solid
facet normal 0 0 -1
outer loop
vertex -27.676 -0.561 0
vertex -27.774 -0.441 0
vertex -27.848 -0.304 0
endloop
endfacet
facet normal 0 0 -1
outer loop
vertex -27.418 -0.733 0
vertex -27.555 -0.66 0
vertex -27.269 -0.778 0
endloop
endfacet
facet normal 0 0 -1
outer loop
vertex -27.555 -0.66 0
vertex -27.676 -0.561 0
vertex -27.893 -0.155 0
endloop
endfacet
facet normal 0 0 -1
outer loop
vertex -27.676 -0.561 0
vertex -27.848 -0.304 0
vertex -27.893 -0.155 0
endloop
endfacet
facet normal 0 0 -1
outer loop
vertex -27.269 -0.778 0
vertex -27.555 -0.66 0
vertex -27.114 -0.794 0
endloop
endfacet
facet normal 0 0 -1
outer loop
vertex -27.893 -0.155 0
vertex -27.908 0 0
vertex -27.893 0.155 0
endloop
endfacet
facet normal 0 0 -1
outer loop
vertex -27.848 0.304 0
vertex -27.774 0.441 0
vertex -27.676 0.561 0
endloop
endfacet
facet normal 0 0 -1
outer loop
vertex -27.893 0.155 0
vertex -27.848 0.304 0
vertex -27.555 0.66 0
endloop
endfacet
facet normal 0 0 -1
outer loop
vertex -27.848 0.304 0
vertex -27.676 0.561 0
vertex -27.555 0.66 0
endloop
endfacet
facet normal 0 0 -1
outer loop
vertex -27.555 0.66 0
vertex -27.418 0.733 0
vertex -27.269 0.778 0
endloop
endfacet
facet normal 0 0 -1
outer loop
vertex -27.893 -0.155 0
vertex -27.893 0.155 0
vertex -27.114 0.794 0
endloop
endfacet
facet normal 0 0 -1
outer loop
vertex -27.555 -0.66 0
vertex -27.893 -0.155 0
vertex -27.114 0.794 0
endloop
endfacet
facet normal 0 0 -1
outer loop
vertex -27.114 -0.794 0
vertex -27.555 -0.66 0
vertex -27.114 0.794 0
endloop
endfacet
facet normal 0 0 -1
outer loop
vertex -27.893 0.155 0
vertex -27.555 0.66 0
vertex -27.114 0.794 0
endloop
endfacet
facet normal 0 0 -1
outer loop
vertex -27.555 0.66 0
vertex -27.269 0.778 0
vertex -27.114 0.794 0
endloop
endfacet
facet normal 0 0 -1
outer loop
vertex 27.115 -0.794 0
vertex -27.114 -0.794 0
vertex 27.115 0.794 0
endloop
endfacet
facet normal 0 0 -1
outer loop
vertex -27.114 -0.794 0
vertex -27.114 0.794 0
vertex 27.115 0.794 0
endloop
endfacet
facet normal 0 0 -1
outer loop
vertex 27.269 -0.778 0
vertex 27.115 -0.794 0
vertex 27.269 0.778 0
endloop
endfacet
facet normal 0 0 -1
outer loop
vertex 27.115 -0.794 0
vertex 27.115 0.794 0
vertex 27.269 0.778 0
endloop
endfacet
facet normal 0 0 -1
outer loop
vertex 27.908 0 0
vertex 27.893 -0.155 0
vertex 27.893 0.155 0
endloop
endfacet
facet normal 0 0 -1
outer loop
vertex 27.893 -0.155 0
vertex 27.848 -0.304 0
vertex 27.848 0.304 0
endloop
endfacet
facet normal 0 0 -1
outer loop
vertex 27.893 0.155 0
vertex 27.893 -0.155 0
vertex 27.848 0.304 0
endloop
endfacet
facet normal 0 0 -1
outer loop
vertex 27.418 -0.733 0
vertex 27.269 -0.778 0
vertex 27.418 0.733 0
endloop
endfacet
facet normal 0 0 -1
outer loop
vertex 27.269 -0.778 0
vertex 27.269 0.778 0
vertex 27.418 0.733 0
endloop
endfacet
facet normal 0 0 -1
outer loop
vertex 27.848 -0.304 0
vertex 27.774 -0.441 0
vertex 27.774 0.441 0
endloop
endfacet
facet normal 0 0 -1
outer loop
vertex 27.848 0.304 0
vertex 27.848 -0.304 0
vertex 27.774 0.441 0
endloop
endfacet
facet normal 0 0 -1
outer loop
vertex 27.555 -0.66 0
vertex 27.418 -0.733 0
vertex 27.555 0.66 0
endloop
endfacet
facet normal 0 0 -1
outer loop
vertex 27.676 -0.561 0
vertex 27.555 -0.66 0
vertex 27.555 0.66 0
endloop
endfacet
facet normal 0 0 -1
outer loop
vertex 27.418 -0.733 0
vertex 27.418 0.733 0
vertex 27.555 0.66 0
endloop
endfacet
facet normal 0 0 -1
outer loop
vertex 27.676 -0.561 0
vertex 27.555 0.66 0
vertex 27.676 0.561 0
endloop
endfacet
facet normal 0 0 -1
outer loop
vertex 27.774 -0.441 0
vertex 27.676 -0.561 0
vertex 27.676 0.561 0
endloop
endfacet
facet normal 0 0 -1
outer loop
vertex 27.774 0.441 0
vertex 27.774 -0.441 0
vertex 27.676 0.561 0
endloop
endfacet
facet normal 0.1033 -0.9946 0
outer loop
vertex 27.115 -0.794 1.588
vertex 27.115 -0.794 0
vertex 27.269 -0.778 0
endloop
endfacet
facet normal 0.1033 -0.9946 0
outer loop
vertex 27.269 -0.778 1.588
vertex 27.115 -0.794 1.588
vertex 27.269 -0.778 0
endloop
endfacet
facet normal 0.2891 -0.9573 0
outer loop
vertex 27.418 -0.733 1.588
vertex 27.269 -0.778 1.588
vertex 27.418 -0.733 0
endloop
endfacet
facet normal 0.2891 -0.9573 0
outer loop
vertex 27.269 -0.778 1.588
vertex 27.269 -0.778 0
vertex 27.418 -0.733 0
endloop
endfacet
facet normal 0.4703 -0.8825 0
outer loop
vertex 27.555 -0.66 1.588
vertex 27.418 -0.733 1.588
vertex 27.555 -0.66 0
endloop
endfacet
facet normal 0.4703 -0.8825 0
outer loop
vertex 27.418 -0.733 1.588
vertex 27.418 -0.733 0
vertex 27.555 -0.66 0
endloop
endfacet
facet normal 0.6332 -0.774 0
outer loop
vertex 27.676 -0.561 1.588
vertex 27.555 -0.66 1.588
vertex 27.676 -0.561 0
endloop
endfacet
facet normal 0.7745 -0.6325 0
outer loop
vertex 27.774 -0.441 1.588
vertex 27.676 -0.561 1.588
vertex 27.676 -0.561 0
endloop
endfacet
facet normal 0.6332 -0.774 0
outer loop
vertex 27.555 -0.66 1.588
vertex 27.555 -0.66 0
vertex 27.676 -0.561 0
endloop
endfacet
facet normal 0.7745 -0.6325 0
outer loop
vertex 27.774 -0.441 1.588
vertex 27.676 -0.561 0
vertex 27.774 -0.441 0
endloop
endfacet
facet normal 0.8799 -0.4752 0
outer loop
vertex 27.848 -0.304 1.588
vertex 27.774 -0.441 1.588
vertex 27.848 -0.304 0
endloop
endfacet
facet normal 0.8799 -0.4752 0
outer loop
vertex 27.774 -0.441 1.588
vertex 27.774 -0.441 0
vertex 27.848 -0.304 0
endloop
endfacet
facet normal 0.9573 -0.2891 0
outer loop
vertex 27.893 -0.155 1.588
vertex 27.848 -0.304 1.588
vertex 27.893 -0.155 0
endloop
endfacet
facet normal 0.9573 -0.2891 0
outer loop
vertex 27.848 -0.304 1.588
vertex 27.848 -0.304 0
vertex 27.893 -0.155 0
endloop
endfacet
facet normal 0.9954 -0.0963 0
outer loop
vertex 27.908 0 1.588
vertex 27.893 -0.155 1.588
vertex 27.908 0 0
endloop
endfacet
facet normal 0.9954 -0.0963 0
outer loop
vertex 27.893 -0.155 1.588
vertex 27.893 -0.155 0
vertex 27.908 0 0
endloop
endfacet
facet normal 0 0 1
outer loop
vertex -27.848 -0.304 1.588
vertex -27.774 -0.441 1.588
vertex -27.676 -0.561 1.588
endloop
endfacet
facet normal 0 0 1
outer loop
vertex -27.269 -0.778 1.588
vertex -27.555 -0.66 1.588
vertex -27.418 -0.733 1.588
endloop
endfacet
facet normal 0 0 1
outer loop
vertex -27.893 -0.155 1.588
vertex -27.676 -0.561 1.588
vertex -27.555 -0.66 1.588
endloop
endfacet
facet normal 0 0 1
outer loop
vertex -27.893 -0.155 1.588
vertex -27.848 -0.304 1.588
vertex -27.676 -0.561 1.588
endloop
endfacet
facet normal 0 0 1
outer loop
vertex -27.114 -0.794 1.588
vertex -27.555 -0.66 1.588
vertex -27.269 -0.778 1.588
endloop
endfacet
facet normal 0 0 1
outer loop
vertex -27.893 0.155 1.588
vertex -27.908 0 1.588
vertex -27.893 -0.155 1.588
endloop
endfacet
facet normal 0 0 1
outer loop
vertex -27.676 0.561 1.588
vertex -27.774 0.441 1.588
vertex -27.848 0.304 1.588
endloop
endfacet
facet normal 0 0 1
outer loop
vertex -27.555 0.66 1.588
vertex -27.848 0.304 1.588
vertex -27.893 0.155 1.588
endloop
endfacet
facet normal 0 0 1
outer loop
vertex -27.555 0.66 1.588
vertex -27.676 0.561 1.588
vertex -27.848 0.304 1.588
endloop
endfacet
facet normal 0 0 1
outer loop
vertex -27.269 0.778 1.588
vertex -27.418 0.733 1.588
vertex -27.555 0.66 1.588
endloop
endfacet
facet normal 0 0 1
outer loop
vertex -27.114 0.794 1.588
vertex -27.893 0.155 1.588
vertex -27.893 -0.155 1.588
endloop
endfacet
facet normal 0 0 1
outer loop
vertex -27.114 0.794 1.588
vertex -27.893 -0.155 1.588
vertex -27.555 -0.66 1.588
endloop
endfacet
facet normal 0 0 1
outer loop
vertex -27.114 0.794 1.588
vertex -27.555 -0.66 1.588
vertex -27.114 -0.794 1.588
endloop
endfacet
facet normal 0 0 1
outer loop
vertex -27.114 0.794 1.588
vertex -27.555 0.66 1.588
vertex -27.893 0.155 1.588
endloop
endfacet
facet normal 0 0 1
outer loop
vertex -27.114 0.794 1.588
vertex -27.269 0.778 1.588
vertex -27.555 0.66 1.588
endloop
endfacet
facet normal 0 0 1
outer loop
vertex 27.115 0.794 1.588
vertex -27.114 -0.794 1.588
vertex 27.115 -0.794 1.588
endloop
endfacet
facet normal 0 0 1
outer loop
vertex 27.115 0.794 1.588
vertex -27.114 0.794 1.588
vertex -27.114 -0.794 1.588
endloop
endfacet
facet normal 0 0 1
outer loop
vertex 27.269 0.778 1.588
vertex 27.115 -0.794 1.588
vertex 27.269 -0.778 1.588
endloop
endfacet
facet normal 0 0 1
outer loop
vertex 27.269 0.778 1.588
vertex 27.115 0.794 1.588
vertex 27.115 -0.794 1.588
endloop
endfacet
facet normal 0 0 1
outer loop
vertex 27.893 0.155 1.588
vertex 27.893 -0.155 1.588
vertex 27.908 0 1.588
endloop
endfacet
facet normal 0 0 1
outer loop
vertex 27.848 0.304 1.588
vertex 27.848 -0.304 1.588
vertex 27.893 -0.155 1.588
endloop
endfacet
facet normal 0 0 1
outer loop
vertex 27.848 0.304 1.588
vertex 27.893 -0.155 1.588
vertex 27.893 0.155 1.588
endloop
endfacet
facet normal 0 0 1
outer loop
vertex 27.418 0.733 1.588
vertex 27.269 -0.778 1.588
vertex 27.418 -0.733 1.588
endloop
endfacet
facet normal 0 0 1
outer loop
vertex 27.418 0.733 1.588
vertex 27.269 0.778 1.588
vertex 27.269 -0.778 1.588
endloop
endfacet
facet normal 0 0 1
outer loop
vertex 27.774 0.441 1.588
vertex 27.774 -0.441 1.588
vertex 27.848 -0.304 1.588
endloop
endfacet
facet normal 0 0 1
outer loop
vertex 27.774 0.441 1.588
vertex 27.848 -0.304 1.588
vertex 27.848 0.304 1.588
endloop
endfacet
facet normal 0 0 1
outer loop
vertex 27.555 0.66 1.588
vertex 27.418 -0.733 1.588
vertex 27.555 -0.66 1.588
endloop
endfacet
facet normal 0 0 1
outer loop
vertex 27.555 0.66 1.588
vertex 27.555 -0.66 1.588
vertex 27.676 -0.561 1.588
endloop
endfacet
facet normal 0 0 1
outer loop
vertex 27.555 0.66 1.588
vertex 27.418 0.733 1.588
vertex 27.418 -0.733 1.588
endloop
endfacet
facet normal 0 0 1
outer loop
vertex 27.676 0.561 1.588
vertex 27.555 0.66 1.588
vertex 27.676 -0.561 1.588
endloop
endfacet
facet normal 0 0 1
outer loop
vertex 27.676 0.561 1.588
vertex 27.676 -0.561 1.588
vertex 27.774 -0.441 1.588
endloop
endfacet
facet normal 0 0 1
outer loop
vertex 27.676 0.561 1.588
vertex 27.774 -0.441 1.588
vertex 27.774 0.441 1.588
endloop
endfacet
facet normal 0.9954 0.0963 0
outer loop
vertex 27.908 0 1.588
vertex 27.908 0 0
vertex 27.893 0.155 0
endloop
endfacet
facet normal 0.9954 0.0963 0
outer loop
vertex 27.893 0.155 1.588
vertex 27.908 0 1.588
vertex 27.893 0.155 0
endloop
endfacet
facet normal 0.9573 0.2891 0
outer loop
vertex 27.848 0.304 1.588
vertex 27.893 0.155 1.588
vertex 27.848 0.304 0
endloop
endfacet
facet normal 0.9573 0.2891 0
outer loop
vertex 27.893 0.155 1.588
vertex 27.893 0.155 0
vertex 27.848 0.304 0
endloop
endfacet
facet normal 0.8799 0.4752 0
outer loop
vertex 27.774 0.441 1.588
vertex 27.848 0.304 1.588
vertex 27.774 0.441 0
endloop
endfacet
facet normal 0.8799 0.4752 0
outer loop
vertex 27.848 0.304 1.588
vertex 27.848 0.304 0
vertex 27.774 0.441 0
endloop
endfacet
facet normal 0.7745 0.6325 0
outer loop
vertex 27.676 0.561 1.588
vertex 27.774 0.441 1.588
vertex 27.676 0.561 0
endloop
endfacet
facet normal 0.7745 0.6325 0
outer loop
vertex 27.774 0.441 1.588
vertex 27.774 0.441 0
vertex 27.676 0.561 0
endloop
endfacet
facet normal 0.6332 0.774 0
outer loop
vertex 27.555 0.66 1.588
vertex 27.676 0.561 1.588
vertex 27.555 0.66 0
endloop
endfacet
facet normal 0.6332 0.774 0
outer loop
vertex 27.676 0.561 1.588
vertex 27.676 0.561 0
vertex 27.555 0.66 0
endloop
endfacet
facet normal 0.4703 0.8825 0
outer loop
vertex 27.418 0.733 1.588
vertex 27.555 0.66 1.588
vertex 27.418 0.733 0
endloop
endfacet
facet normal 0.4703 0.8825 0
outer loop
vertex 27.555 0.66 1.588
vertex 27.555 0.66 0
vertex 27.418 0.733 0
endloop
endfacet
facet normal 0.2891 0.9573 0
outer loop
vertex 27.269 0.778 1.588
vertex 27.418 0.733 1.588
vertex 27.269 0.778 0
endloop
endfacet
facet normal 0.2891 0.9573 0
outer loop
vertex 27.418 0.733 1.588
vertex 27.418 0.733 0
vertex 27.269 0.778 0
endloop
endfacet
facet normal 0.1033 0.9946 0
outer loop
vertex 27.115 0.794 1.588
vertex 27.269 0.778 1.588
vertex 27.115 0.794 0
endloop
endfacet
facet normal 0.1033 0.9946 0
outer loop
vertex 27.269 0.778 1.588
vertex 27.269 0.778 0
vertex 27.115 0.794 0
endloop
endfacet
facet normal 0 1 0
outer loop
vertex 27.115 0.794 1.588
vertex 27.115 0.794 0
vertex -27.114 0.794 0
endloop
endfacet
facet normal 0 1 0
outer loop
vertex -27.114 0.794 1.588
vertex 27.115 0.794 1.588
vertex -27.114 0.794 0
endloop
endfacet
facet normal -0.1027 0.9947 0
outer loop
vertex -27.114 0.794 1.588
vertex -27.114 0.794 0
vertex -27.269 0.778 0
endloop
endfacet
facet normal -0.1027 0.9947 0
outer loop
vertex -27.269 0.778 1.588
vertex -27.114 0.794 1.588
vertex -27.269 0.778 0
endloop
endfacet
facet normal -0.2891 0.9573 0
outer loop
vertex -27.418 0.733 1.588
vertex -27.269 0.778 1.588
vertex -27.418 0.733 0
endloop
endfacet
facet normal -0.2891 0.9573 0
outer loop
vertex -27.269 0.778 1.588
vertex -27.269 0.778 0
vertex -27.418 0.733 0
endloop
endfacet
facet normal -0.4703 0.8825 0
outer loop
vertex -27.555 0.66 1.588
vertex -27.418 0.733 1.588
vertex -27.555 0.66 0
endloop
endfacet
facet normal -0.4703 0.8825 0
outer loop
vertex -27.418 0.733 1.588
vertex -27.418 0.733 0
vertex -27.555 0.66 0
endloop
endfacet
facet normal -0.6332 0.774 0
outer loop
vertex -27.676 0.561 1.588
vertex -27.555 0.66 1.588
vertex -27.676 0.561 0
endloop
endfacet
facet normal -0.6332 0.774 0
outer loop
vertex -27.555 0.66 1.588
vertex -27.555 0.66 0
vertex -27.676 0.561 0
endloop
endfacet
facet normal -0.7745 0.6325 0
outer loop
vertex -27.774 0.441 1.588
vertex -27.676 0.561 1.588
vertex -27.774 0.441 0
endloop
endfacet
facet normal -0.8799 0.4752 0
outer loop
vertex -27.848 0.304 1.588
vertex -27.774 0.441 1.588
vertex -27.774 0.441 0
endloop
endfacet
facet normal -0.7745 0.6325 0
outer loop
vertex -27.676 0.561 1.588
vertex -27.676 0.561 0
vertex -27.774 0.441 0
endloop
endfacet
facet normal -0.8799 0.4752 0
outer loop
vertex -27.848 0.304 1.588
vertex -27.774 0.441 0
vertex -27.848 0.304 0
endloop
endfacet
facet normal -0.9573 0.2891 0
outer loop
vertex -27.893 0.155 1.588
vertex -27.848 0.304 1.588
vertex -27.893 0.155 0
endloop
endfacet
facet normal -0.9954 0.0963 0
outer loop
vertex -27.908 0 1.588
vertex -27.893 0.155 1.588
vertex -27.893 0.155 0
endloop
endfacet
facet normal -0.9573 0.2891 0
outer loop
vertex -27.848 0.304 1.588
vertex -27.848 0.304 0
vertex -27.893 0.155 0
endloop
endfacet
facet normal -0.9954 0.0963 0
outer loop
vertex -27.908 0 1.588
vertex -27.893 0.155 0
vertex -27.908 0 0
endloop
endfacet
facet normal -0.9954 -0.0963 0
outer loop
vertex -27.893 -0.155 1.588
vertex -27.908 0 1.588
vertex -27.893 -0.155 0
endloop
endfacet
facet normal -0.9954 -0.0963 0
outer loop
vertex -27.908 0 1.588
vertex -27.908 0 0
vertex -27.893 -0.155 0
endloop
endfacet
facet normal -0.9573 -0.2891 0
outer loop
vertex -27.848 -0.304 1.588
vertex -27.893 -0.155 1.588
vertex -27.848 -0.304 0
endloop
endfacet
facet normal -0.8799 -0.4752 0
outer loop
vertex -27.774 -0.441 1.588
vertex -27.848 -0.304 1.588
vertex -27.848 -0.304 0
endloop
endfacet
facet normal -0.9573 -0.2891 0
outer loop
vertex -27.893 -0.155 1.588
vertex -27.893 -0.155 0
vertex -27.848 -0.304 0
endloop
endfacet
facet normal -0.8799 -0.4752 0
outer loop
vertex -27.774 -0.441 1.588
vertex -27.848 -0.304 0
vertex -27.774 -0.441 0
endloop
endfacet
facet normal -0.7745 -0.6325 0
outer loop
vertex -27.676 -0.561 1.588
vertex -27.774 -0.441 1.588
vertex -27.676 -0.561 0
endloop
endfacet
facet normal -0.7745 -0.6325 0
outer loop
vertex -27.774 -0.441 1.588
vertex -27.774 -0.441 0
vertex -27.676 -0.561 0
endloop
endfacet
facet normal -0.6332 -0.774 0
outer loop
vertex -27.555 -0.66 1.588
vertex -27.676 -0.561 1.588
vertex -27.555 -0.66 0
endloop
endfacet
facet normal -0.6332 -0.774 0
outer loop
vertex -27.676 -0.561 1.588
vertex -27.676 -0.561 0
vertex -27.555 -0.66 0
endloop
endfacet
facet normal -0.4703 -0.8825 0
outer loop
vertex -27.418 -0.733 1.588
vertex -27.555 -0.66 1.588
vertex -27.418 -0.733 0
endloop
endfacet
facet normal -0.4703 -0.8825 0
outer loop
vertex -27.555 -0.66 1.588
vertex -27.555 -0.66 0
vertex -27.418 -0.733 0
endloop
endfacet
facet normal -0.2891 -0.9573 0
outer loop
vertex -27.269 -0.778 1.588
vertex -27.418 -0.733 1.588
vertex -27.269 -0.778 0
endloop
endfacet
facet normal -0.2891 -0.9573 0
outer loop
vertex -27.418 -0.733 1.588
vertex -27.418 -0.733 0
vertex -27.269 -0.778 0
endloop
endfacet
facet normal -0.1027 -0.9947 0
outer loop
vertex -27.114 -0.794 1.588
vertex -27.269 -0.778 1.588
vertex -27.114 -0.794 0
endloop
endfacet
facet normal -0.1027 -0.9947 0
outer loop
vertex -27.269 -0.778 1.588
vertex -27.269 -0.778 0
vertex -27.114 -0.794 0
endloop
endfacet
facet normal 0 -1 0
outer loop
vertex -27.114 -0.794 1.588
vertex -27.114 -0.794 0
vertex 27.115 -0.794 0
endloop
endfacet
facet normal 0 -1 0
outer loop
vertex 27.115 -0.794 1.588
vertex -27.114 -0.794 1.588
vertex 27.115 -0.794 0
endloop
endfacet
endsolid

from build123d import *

# Parameters (mm, degrees)
F1_DEPTH = 1.5875


with BuildPart() as f1:
    # F0 (on Top) → F1 (new body)
    with BuildSketch(Plane.XY):
        with BuildLine():
            Line((27.1145, 0.79375), (27.1145, -0.79375))
            ThreePointArc((27.1145, -0.79375), (27.675766, -0.561266), (27.90825, 0))
            ThreePointArc((27.90825, 0), (27.675766, 0.561266), (27.1145, 0.79375))
        make_face()
        with BuildLine():
            ThreePointArc((27.1145, 0.79375), (26.32075, 0), (27.1145, -0.79375))
            Line((27.1145, -0.79375), (27.1145, 0.79375))
        make_face()
        with BuildLine():
            Line((-27.1145, -0.79375), (27.1145, -0.79375))
            ThreePointArc((27.1145, -0.79375), (26.32075, 0), (27.1145, 0.79375))
            Line((27.1145, 0.79375), (-27.1145, 0.79375))
            ThreePointArc((-27.1145, 0.79375), (-26.553234, 0.561266), (-26.32075, 0))
            ThreePointArc((-26.32075, 0), (-26.553234, -0.561266), (-27.1145, -0.79375))
        make_face()
        with BuildLine():
            ThreePointArc((-27.1145, 0.79375), (-27.90825, 0), (-27.1145, -0.79375))
            Line((-27.1145, -0.79375), (-27.1145, 0.79375))
        make_face()
        with BuildLine():
            Line((-27.1145, 0.79375), (-27.1145, -0.79375))
            ThreePointArc((-27.1145, -0.79375), (-26.553234, -0.561266), (-26.32075, 0))
            ThreePointArc((-26.32075, 0), (-26.553234, 0.561266), (-27.1145, 0.79375))
        make_face()
    extrude(amount=F1_DEPTH)


solid = f1.part
